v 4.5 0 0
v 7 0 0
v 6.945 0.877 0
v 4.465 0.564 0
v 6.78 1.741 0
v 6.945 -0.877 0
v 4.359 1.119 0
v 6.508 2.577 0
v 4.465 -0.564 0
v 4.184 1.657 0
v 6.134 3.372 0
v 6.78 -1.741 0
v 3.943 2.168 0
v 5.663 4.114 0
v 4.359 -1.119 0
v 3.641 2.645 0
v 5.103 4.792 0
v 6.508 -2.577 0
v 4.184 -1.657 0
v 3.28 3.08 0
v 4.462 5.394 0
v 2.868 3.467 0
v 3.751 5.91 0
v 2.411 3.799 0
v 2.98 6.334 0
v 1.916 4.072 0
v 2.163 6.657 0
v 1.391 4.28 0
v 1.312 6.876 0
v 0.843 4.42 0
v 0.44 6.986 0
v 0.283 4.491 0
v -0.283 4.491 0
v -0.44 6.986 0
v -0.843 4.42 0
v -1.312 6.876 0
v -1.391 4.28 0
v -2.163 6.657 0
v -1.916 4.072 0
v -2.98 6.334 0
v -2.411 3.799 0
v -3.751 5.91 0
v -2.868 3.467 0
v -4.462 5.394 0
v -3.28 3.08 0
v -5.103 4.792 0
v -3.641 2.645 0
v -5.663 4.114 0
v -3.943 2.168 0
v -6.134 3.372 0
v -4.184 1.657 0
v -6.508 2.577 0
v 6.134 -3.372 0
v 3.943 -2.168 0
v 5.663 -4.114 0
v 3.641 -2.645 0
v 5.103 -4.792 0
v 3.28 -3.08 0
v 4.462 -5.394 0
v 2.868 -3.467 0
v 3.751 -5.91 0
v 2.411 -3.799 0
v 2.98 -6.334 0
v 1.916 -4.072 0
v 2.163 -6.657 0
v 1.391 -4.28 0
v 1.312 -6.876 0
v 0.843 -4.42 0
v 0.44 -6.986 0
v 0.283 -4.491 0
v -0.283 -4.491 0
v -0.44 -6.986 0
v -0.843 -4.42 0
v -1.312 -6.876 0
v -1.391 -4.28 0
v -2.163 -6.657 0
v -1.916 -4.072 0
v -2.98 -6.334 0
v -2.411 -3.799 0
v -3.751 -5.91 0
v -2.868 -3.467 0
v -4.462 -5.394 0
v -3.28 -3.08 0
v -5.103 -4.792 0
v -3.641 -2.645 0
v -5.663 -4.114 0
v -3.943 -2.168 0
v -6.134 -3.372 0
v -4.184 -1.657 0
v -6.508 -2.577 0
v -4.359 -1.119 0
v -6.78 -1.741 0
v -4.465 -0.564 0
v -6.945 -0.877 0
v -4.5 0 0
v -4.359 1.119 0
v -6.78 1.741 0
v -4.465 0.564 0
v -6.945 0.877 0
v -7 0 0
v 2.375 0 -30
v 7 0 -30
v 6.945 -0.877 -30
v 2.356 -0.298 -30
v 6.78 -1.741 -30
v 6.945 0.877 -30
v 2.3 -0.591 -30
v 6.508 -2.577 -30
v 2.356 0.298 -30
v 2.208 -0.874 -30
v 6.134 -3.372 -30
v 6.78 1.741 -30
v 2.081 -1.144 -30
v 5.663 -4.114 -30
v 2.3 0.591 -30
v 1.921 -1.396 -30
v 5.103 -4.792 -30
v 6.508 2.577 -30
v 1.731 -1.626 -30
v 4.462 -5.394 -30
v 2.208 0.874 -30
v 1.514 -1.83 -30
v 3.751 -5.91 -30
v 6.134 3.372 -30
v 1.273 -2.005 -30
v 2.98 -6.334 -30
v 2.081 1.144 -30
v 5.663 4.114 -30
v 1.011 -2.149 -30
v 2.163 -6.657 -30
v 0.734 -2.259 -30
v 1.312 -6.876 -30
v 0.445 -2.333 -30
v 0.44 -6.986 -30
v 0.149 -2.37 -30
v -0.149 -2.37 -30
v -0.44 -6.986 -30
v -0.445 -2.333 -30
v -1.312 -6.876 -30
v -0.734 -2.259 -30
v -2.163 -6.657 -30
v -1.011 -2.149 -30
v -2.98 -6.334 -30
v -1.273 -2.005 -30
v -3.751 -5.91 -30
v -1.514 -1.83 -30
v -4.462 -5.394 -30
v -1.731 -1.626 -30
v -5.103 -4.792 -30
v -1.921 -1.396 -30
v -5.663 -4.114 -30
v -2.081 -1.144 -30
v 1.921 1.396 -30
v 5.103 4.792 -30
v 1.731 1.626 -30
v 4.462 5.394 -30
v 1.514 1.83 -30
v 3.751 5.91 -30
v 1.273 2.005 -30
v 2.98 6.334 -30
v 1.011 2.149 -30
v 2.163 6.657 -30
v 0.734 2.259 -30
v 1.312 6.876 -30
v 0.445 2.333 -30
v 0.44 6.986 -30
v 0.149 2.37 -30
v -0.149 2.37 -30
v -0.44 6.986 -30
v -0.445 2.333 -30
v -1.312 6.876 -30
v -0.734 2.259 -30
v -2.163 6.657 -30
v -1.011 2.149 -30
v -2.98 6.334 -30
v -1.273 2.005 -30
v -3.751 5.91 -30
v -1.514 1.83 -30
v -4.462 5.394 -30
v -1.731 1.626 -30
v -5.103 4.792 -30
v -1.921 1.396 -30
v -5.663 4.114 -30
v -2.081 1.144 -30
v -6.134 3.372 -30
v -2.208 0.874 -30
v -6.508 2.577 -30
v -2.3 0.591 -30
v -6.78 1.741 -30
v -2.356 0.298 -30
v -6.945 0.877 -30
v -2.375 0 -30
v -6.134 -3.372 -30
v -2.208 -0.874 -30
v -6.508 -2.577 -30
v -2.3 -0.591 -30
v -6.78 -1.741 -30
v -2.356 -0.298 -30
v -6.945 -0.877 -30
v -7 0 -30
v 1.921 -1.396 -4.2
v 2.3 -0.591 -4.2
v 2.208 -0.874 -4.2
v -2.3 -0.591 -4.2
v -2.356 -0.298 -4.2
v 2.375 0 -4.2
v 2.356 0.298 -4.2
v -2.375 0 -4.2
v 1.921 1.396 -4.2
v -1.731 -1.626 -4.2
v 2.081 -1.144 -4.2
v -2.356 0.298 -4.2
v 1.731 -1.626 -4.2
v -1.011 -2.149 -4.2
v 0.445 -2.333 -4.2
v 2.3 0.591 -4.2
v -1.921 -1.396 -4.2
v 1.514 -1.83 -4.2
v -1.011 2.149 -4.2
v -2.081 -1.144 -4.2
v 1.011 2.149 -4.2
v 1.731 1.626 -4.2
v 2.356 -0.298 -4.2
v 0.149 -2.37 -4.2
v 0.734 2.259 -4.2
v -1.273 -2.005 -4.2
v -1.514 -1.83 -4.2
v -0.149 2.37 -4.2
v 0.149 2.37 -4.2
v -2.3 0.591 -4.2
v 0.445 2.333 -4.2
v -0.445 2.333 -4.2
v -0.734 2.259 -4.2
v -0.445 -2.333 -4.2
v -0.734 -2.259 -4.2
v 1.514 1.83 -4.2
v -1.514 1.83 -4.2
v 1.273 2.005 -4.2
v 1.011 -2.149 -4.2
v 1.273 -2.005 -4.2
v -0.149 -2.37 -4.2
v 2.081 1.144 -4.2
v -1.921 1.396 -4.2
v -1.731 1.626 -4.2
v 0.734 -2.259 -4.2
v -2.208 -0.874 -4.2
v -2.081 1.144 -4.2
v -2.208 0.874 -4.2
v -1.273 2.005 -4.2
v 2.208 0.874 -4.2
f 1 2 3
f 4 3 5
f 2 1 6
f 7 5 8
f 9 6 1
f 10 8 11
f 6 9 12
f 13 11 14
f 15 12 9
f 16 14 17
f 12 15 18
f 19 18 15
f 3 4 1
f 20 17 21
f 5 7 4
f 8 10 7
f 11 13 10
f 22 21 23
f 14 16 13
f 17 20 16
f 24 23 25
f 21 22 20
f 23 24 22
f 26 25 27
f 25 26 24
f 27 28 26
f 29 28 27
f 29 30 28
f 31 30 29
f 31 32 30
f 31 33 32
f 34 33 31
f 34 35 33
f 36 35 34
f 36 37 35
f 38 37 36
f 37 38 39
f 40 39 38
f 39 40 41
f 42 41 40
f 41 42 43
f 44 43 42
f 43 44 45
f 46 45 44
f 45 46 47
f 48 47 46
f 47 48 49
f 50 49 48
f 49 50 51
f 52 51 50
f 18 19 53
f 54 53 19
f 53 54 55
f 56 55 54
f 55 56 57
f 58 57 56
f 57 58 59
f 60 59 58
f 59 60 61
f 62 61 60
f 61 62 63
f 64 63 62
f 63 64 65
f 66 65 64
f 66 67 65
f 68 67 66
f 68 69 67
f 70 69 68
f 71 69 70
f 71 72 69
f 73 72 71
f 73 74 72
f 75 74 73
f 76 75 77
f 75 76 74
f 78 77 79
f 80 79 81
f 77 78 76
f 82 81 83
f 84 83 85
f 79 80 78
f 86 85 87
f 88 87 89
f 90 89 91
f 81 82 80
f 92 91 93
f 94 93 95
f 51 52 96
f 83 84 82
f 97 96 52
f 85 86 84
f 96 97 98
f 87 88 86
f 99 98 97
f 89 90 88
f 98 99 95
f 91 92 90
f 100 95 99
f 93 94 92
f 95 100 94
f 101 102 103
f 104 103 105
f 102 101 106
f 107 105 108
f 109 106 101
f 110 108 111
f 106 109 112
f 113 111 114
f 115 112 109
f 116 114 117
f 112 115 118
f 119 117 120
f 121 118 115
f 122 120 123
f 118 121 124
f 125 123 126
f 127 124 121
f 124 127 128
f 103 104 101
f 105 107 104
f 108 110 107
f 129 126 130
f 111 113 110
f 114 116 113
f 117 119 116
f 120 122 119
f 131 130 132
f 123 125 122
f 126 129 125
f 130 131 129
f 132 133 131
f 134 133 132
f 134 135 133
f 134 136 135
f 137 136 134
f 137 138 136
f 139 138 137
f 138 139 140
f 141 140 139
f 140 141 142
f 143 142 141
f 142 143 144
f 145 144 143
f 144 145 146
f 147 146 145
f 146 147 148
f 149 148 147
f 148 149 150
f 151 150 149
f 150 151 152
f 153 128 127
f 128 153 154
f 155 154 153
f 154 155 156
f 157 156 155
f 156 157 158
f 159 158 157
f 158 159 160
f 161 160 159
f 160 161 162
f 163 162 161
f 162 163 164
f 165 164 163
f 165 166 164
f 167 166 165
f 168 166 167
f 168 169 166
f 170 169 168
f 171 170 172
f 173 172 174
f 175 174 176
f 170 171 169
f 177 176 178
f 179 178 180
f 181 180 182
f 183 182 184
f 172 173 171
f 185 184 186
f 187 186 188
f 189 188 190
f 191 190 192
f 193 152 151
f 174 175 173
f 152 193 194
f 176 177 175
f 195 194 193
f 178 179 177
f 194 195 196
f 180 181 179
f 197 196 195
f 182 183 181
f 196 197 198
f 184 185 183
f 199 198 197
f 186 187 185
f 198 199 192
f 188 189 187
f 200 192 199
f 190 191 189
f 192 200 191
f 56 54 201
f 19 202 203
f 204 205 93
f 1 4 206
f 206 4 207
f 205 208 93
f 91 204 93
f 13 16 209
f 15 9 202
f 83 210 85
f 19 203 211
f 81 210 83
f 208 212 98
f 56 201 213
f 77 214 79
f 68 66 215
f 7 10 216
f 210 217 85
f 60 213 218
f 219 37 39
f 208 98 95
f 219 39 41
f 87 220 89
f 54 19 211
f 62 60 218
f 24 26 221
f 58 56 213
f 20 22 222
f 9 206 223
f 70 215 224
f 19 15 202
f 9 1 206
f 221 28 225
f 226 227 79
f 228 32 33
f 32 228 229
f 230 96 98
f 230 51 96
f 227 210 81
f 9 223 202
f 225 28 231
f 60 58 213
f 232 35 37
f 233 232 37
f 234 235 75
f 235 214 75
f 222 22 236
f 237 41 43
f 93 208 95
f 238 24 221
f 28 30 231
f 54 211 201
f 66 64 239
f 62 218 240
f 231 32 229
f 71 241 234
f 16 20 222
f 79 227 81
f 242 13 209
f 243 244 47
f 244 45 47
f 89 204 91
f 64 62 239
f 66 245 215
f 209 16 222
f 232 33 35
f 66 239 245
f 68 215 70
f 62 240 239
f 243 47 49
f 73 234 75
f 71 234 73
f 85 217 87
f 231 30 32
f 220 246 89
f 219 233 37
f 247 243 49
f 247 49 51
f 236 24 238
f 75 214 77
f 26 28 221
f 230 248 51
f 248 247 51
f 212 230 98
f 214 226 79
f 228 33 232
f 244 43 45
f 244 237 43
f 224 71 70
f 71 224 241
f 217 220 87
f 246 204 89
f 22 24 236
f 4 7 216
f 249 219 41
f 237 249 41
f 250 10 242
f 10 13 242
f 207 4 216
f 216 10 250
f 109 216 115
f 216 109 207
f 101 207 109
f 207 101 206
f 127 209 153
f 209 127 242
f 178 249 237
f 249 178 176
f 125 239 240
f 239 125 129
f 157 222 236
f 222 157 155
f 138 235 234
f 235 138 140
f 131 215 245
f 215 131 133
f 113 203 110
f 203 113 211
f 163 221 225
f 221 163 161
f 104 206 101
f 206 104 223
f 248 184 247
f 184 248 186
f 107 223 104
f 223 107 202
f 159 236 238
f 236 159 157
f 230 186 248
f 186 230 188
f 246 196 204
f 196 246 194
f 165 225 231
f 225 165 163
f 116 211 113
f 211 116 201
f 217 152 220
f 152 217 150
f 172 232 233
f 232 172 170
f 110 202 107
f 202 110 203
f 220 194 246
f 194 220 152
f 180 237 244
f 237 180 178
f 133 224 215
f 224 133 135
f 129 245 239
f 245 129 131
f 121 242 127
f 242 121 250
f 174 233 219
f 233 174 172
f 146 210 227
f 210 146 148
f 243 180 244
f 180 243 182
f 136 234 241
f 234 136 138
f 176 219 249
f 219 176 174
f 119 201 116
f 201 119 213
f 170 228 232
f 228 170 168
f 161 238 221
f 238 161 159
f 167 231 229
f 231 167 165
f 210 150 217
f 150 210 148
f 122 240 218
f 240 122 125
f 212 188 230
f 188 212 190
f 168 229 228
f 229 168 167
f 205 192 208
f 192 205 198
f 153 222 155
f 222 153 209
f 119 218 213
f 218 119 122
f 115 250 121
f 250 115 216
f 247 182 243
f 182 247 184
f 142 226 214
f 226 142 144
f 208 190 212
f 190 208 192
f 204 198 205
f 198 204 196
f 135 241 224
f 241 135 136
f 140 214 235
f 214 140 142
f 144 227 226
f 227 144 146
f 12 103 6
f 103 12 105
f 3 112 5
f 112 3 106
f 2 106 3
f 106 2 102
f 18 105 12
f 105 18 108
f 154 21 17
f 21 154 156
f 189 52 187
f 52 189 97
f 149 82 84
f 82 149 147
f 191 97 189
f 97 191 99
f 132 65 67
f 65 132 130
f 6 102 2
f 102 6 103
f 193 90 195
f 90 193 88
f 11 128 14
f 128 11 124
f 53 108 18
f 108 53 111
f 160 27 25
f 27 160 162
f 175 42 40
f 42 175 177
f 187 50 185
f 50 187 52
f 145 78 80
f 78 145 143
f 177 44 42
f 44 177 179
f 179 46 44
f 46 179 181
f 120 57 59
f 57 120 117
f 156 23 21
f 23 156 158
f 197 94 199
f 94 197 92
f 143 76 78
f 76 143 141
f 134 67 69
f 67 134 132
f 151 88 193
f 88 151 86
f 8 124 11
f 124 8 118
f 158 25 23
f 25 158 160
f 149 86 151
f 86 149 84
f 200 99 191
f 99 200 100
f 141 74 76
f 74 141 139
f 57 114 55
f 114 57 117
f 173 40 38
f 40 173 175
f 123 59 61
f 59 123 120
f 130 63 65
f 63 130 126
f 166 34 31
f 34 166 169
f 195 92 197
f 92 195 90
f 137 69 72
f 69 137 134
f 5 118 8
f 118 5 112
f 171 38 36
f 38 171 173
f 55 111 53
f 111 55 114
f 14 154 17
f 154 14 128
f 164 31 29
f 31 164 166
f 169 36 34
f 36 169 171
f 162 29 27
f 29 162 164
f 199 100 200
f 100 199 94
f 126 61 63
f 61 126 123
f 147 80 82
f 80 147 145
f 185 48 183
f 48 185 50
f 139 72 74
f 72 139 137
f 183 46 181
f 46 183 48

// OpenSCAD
$fn = 50;


difference() {
	union() {
		translate(v = [0, 0, -30.0000000000]) {
			cylinder(h = 30, r = 7.0000000000);
		}
		cylinder(h = 0, r = 17.0000000000);
	}
	union() {
		translate(v = [0, 0, 0]) {
			rotate(a = [0, 0, 0]) {
				difference() {
					union() {
						#translate(v = [0, 0, -30.0000000000]) {
							cylinder(h = 30, r = 2.2500000000);
						}
						#translate(v = [0, 0, -4.2000000000]) {
							cylinder(h = 4.2000000000, r1 = 2.3750000000, r2 = 4.5000000000);
						}
						#translate(v = [0, 0, -30.0000000000]) {
							cylinder(h = 30, r = 2.3750000000);
						}
						#translate(v = [0, 0, -30.0000000000]) {
							cylinder(h = 30, r = 2.2500000000);
						}
					}
					union();
				}
			}
		}
	}
}
